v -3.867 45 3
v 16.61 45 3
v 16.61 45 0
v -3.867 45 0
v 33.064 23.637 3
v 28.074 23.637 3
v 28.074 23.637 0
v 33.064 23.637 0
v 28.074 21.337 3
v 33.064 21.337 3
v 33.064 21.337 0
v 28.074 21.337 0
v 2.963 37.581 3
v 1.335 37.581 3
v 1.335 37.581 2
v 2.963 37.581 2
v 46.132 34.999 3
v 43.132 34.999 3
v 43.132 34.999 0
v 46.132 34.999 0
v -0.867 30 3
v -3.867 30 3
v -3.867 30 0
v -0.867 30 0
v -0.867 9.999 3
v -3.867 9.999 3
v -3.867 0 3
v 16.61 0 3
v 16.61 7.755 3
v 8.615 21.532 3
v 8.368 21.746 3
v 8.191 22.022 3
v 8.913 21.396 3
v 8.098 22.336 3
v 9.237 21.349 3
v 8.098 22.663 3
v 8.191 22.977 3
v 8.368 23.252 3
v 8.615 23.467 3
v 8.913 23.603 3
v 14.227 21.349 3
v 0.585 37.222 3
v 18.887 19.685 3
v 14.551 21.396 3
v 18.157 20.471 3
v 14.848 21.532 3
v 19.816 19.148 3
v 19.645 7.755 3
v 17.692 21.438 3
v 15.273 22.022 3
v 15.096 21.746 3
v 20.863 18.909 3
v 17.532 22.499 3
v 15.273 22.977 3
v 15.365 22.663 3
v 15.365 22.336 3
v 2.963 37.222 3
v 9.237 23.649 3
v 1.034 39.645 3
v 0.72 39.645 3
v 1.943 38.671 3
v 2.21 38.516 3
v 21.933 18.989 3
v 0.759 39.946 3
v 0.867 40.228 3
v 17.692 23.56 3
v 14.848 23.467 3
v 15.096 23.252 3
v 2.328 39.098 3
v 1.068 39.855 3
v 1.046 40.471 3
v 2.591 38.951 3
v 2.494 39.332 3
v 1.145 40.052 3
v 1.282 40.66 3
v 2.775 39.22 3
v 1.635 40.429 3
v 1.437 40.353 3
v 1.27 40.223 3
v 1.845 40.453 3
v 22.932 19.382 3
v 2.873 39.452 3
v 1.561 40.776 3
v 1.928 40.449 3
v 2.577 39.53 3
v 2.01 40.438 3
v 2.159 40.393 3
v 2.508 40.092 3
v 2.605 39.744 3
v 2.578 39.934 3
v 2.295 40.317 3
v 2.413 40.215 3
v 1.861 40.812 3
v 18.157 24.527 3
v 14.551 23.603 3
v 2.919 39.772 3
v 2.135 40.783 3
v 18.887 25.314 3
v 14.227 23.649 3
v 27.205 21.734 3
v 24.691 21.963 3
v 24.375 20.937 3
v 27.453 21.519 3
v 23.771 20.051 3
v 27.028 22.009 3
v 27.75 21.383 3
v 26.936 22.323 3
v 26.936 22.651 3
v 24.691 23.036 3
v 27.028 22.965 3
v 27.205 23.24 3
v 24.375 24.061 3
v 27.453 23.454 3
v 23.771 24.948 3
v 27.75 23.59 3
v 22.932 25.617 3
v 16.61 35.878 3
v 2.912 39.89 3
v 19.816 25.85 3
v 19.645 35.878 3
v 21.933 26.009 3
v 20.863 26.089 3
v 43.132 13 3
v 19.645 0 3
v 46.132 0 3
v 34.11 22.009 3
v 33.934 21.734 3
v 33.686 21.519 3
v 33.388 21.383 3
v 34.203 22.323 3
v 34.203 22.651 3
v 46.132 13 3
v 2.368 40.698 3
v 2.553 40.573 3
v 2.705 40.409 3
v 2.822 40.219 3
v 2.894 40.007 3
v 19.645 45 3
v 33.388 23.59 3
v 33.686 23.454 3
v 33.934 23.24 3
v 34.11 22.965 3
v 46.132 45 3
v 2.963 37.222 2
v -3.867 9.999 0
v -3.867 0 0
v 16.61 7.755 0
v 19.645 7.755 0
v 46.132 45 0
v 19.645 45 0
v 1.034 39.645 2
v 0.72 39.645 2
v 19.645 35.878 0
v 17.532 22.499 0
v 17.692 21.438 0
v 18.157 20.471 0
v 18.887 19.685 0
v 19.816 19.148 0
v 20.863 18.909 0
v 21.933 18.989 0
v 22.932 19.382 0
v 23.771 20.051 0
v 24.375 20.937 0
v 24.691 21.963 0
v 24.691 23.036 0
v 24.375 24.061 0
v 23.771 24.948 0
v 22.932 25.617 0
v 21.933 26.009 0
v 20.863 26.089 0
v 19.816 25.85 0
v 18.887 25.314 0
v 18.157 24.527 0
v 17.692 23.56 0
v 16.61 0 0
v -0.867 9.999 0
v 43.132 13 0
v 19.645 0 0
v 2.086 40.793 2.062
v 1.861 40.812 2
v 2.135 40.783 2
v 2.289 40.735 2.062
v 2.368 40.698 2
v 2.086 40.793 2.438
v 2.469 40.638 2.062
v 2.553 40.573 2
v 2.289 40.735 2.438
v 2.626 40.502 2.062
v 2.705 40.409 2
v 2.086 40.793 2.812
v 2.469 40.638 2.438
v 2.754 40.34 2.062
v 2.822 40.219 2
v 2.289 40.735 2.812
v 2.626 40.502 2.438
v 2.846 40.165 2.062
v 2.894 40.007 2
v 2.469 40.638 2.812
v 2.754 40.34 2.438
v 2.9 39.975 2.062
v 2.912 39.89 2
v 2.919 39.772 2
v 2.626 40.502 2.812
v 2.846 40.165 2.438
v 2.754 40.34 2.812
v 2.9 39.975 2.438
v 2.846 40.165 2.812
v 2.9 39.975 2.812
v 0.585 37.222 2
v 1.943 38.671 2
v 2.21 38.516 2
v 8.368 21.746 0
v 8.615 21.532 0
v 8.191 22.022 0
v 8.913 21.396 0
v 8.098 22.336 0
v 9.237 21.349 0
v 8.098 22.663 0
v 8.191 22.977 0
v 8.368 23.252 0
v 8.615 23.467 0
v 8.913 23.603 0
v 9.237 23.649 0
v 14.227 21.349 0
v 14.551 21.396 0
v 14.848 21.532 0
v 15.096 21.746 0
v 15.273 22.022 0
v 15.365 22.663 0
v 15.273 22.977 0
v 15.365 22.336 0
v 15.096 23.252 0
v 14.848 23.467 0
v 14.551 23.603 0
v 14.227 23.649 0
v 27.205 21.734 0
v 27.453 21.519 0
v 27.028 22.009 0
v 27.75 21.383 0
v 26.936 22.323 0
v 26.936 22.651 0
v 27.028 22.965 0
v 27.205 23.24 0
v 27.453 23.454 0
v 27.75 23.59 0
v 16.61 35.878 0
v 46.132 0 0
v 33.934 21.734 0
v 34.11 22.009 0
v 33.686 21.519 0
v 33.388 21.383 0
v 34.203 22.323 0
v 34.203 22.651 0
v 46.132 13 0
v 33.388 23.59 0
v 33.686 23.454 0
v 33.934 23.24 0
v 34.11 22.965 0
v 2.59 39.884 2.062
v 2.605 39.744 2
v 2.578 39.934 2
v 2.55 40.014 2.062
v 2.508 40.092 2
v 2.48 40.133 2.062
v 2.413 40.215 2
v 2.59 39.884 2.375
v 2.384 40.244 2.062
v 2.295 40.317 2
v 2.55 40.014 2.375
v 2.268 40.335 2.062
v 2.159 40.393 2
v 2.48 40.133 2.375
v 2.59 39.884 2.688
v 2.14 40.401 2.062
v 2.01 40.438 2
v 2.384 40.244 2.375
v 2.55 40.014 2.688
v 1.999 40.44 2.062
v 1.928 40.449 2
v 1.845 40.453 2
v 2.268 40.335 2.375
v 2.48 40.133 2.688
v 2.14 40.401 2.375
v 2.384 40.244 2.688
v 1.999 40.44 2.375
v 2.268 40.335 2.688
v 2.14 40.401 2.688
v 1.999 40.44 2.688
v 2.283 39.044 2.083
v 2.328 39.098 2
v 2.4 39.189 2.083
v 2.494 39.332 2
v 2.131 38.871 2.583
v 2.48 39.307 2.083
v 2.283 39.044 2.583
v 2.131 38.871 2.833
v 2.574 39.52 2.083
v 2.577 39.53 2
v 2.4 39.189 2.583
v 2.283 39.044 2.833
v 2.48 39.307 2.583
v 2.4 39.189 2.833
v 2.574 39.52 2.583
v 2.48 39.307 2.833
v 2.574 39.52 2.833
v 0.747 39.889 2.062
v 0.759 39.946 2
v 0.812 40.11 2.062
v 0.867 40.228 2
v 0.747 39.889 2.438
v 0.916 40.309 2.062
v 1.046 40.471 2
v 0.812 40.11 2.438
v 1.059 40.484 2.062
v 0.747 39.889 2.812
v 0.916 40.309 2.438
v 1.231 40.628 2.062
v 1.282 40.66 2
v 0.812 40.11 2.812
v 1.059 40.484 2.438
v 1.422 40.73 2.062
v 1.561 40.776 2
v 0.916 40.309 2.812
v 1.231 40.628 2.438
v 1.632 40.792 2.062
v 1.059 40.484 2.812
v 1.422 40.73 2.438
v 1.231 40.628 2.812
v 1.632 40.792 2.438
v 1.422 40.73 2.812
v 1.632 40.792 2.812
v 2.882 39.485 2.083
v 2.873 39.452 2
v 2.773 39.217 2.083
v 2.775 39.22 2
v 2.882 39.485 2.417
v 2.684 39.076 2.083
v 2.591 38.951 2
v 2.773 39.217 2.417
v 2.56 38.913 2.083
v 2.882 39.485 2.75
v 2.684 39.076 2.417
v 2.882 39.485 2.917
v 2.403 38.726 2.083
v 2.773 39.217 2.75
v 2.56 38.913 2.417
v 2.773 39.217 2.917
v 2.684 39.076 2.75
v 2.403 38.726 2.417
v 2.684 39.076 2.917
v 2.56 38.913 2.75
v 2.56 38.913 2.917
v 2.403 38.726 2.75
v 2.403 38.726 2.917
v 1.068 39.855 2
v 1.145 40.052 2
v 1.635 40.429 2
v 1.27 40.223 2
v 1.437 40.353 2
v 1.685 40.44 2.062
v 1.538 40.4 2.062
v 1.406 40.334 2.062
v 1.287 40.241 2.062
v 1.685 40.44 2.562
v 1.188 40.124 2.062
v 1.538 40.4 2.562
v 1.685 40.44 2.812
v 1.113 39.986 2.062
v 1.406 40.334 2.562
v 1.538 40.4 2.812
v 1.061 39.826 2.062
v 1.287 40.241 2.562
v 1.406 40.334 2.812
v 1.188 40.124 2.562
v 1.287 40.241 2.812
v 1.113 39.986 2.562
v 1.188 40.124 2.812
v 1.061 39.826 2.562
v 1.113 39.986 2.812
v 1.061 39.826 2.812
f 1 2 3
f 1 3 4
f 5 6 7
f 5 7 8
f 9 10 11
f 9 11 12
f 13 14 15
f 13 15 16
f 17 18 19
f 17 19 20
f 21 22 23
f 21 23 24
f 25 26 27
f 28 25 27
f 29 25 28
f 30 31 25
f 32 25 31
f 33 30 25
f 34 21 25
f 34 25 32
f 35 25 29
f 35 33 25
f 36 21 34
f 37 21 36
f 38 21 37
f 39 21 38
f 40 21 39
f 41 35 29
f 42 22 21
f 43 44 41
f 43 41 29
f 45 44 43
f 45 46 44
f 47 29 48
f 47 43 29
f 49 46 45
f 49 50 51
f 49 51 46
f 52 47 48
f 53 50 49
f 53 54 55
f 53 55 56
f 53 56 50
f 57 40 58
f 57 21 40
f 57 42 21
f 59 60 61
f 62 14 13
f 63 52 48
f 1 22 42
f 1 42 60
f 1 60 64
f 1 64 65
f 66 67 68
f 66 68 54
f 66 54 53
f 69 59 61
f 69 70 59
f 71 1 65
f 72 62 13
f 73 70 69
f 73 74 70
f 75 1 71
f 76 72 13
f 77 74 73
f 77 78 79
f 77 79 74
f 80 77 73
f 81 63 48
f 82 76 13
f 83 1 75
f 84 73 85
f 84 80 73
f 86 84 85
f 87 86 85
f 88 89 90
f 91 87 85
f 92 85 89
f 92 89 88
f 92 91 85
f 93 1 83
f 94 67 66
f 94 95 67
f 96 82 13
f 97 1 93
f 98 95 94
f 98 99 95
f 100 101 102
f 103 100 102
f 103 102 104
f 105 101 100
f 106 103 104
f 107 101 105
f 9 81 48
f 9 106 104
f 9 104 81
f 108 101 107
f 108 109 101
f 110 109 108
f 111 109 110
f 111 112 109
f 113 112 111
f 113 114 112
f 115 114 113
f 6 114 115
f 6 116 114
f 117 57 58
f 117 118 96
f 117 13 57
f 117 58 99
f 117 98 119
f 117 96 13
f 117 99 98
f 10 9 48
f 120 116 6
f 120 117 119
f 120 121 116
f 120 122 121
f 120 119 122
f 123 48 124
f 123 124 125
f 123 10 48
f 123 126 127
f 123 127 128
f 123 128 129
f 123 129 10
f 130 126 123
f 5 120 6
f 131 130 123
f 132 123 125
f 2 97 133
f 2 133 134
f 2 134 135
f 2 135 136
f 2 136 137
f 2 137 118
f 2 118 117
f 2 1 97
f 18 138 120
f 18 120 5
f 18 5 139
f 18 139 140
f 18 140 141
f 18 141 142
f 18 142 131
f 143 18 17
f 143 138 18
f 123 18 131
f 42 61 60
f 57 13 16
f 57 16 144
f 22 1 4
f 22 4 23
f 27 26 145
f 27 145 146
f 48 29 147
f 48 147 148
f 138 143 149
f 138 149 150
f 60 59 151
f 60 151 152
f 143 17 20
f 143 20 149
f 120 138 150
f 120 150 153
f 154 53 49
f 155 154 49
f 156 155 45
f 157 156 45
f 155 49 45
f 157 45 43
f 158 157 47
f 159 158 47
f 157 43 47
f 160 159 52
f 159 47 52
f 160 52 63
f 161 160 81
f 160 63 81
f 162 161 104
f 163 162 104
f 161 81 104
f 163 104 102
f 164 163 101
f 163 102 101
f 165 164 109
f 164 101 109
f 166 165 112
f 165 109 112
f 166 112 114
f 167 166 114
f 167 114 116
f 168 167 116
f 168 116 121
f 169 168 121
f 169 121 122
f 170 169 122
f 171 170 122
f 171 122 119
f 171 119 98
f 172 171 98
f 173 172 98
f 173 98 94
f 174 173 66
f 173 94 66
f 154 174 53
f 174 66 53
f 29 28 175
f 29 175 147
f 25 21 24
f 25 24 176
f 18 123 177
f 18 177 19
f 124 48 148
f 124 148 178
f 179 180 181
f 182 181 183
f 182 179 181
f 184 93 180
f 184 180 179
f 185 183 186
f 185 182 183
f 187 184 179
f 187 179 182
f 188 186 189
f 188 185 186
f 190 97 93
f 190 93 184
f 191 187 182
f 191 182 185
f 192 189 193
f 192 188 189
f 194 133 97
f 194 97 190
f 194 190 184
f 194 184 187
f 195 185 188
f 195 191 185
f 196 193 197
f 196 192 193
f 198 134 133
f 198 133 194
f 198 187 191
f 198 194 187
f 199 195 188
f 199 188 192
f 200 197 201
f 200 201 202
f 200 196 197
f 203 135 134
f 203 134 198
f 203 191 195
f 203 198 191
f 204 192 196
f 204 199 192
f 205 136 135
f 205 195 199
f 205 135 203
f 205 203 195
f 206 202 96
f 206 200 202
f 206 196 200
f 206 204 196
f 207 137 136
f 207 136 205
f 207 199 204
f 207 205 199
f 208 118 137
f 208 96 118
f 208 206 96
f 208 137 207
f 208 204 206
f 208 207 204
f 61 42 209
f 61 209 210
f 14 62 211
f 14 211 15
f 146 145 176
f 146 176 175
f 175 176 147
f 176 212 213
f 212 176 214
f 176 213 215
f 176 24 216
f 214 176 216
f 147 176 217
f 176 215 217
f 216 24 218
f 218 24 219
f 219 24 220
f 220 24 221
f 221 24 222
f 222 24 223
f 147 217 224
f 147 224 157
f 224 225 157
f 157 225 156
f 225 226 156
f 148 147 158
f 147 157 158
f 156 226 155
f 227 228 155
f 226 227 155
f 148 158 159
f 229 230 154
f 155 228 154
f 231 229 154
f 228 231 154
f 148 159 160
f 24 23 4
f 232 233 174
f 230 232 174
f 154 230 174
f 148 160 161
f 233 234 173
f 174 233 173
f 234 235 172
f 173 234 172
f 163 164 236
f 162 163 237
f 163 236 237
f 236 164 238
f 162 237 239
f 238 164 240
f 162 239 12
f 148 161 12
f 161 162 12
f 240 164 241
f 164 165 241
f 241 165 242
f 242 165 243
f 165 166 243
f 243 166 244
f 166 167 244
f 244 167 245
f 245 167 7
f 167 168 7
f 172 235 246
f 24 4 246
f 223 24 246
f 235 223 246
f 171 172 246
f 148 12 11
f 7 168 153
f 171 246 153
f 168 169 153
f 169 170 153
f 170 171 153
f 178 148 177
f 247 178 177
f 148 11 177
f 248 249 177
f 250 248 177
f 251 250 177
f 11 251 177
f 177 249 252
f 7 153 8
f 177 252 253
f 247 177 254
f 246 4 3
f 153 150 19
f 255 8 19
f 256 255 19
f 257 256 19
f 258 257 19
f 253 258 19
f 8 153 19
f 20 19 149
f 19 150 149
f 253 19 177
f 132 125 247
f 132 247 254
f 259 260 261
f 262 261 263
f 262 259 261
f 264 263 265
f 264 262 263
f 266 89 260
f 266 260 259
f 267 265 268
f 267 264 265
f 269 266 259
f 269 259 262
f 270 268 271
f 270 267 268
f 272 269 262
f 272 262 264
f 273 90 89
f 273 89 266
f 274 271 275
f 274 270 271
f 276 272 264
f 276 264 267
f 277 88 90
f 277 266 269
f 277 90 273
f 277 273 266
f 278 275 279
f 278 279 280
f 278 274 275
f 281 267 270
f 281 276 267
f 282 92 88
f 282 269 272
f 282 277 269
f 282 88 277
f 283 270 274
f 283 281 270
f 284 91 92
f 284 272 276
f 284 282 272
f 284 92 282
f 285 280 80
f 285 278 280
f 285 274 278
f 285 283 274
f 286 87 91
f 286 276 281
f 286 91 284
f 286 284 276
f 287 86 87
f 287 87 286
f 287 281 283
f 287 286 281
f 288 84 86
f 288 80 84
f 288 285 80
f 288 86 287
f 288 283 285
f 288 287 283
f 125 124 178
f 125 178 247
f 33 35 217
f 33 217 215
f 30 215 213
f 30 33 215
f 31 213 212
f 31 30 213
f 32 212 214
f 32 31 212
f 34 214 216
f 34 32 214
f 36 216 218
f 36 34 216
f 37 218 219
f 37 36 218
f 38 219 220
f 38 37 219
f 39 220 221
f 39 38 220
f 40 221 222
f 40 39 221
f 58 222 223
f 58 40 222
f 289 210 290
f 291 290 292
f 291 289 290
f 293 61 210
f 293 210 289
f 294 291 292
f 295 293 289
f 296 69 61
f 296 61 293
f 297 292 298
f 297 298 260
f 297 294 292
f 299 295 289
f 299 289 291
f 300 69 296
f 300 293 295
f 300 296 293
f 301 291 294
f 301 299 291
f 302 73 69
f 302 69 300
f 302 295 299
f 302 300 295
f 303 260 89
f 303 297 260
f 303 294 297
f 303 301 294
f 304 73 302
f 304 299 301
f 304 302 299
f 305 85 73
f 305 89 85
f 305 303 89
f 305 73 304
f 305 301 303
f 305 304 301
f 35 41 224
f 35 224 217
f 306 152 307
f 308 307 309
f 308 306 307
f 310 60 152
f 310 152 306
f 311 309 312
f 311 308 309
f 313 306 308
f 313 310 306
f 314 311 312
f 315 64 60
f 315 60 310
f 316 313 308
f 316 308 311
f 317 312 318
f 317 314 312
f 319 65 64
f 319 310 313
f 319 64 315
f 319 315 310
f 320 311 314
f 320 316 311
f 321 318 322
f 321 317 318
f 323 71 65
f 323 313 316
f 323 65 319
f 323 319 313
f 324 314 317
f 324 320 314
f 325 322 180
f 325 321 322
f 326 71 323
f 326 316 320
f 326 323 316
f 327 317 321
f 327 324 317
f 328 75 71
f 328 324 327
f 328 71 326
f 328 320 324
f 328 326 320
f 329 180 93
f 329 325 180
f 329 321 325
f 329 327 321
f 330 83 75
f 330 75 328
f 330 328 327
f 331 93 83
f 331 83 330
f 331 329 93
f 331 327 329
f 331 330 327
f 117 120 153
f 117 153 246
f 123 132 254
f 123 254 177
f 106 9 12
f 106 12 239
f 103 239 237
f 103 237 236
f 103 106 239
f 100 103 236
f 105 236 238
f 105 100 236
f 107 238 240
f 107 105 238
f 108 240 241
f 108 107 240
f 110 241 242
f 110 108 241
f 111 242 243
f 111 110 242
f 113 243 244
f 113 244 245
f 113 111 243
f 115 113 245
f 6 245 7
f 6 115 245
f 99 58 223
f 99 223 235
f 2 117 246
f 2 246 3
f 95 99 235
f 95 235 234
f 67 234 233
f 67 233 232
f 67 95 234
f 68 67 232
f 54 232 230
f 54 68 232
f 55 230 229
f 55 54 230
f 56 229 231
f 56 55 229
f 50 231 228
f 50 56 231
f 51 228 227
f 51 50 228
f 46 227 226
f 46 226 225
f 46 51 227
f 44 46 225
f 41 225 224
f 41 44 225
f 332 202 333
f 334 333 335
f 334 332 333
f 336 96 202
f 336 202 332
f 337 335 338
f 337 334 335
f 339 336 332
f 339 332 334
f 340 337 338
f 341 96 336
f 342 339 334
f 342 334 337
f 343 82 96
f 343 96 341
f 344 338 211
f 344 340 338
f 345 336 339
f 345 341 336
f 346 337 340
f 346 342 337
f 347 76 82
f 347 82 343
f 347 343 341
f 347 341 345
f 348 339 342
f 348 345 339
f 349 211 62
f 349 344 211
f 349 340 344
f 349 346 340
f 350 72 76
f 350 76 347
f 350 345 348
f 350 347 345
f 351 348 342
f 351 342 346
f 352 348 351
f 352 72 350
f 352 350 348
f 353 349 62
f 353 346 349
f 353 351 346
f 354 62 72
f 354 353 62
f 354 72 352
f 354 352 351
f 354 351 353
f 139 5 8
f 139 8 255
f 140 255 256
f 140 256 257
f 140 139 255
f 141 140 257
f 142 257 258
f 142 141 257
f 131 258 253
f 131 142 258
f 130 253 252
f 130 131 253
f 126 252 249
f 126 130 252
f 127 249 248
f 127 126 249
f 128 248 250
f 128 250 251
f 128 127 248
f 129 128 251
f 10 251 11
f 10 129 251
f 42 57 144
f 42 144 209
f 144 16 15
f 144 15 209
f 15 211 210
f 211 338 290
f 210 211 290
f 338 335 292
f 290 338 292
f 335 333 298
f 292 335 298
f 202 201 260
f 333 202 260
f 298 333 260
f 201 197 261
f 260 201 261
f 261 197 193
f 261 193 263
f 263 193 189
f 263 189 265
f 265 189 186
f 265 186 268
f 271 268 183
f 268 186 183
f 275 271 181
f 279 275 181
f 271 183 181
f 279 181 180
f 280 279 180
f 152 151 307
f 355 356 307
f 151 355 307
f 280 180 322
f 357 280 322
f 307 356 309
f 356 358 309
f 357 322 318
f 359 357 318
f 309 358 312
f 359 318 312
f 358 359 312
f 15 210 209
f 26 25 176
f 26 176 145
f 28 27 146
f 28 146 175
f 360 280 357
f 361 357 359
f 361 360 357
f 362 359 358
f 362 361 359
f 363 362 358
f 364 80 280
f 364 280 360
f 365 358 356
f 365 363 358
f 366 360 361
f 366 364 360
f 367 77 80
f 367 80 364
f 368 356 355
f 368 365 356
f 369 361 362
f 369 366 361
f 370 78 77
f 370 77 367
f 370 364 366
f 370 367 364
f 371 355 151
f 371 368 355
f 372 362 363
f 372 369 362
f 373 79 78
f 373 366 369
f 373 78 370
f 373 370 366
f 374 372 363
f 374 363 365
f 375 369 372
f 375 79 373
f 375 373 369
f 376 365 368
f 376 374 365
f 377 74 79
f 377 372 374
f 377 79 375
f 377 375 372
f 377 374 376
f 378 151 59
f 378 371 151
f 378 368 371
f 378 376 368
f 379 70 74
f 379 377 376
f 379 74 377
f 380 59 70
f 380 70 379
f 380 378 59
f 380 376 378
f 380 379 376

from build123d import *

# Parameters (mm, degrees)
SKETCH_1_R          = 3.6
EXTRUDE_1_DEPTH     = 3
CUT_EXTRUDE_2_DEPTH = 1


with BuildPart() as part:
    # 草图1 → 凸台-拉伸1 (new body)
    with BuildSketch(Plane.XY.offset(3)):
        Polygon((46.131858504, 44.9999), (19.645182907, 44.9999), (19.645182907, 35.877980345), (16.61, 35.877980345), (16.61, 44.9999), (-3.867371496, 44.9999), (-3.867371496, 29.9998), (-0.867341496, 29.9998), (-0.867341496, 9.9991), (-3.867371496, 9.9991), (-3.867371496, 0), (16.61, 0), (16.61, 7.754820329), (19.645182907, 7.754820329), (19.645182907, 0), (46.131858504, 0), (46.131858504, 13.0005), (43.131858504, 13.0005), (43.131858504, 34.9994), (46.131858504, 34.9994), align=None)
        with Locations(Location((21.131658504, 22.4992, 0), (0, 0, 180))):
            Circle(SKETCH_1_R, mode=Mode.SUBTRACT)
        with BuildLine():
            Line((9.236684618, 23.64925), (14.226589495, 23.64925))
            ThreePointArc((14.226589495, 23.64925), (15.376589495, 22.49925), (14.226589495, 21.34925))
            Line((14.226589495, 21.34925), (9.236684618, 21.34925))
            ThreePointArc((9.236684618, 21.34925), (8.086684618, 22.49925), (9.236684618, 23.64925))
        make_face(mode=Mode.SUBTRACT)
        with BuildLine():
            Line((33.064389495, 21.33685), (28.074484618, 21.33685))
            ThreePointArc((28.074484618, 21.33685), (26.924484618, 22.48685), (28.074484618, 23.63685))
            Line((28.074484618, 23.63685), (33.064389495, 23.63685))
            ThreePointArc((33.064389495, 23.63685), (34.214389495, 22.48685), (33.064389495, 21.33685))
        make_face(mode=Mode.SUBTRACT)
    extrude(amount=-EXTRUDE_1_DEPTH)

    # 草图3 → 切除-拉伸2 (cut)
    with BuildSketch(Plane.XY.offset(3)):
        with BuildLine():
            Line((1.034005341, 39.645473757), (0.719902777, 39.645473757))
            add(Edge.make_bspline(
                [(0.719902777, 39.645473757), (0.72194993, 39.687144645), (0.725970484, 39.768985159), (0.744798774, 39.888309066), (0.771739651, 40.002363865), (0.809831105, 40.110233779), (0.857137383, 40.212872586), (0.91386741, 40.309872601), (0.98106126, 40.40086379), (1.057267995, 40.485002633), (1.140036634, 40.562190204), (1.229342573, 40.628845447), (1.3231876, 40.685163118), (1.421286999, 40.73224436), (1.524747563, 40.767584206), (1.632630421, 40.793805846), (1.745409557, 40.809582191), (1.822249579, 40.811277977), (1.861329059, 40.812140424)],
                knots=[0, 0, 0, 0, 1.10065271, 2.161652631, 3.183658789, 4.190468796, 5.17591951, 6.163126047, 7.15150782, 8.156236427, 9.156009102, 10.134482811, 11.092018607, 12.041330605, 13.001268258, 13.972401359, 14.968799086, 16, 16, 16, 16], degree=3))
            add(Edge.make_bspline(
                [(1.861329059, 40.812140424), (1.899707133, 40.811241967), (1.975118678, 40.809476532), (2.085180693, 40.794315503), (2.189957987, 40.770569912), (2.289245754, 40.737254495), (2.382251818, 40.692470068), (2.469674863, 40.638672529), (2.552555673, 40.576452698), (2.627162457, 40.503198884), (2.695670536, 40.4249965), (2.754772791, 40.341508596), (2.805385955, 40.255279311), (2.847573635, 40.165651109), (2.878629774, 40.071780081), (2.902207982, 39.975032878), (2.915535395, 39.874408067), (2.917580819, 39.806301511), (2.918620726, 39.77167568)],
                knots=[0, 0, 0, 0, 1.111607364, 2.184268762, 3.212621178, 4.221274766, 5.211760367, 6.196651075, 7.1921475, 8.207485113, 9.220403448, 10.201281604, 11.166441695, 12.114753415, 13.065576456, 14.026450734, 14.996634279, 16, 16, 16, 16], degree=3))
            add(Edge.make_bspline(
                [(2.918620726, 39.77167568), (2.916927463, 39.722927846), (2.913570652, 39.626287632), (2.884856275, 39.484272769), (2.840009764, 39.34667935), (2.786012407, 39.235942048), (2.731539963, 39.146708554), (2.682452456, 39.073239849), (2.624987645, 38.994134381), (2.558309147, 38.909657044), (2.483796274, 38.819146138), (2.400774111, 38.722656343), (2.308650629, 38.621184573), (2.243992128, 38.551878972), (2.210487713, 38.515966546)],
                knots=[0, 0, 0, 0, 1.184426356, 2.348067706, 3.509069118, 4.696110526, 5.333549288, 6.050745305, 6.844228056, 7.710549037, 8.667450064, 9.695053472, 10.805634456, 12, 12, 12, 12], degree=3))
            Line((2.210487713, 38.515966546), (1.334786591, 37.581371193))
            Line((1.334786591, 37.581371193), (2.963492521, 37.581371193))
            Line((2.963492521, 37.581371193), (2.963492521, 37.222396834))
            Line((2.963492521, 37.222396834), (0.585287393, 37.222396834))
            Line((0.585287393, 37.222396834), (1.942659188, 38.670914462))
            add(Edge.make_bspline(
                [(1.942659188, 38.670914462), (1.975707074, 38.705412769), (2.039185301, 38.771676955), (2.128967878, 38.868419915), (2.209606867, 38.958169456), (2.281624259, 39.040756005), (2.343457765, 39.117387572), (2.398329997, 39.185582276), (2.442295588, 39.248336726), (2.490010983, 39.32107734), (2.536224965, 39.409889657), (2.575937321, 39.518423347), (2.600152169, 39.630150599), (2.603057005, 39.705652636), (2.604518162, 39.743630808)],
                knots=[0, 0, 0, 0, 1.329631726, 2.553950428, 3.673215718, 4.687767853, 5.603093632, 6.413772471, 7.123043292, 7.734684054, 8.834405432, 9.900288307, 10.943827018, 12, 12, 12, 12], degree=3))
            add(Edge.make_bspline(
                [(2.604518162, 39.743630808), (2.60388242, 39.767512207), (2.602629494, 39.814577857), (2.591571796, 39.883583616), (2.57486129, 39.95014843), (2.550916032, 40.014477049), (2.519309292, 40.075922701), (2.480835912, 40.134560181), (2.436445849, 40.191249147), (2.385094579, 40.244402445), (2.328683059, 40.29308365), (2.26908881, 40.336207736), (2.206038706, 40.372246846), (2.139798583, 40.401790343), (2.070553114, 40.424965725), (1.998168369, 40.441024304), (1.922844353, 40.451106788), (1.871410857, 40.45247096), (1.845203258, 40.453166065)],
                knots=[0, 0, 0, 0, 0.991446411, 1.95395049, 2.89581595, 3.838931463, 4.798493298, 5.75982156, 6.748411868, 7.785213223, 8.824556874, 9.840280684, 10.836137867, 11.835679398, 12.848801643, 13.863922112, 14.911575587, 16, 16, 16, 16], degree=3))
            add(Edge.make_bspline(
                [(1.845203258, 40.453166065), (1.817832425, 40.452451033), (1.764080629, 40.451046827), (1.685161596, 40.441224163), (1.609875819, 40.424278323), (1.538033916, 40.401101648), (1.46951433, 40.3716431), (1.404650286, 40.334951355), (1.343587397, 40.291167862), (1.286210873, 40.241527305), (1.233346894, 40.186259704), (1.186900018, 40.124649741), (1.146316004, 40.057822326), (1.110906771, 39.985957775), (1.082151081, 39.908403995), (1.06017793, 39.82543629), (1.042791083, 39.737414909), (1.036982563, 39.676629824), (1.034005341, 39.645473757)],
                knots=[0, 0, 0, 0, 1.031018746, 2.02475058, 2.990194455, 3.934040569, 4.864654155, 5.795059489, 6.735614925, 7.690564532, 8.649604399, 9.611025574, 10.590972636, 11.591080095, 12.624614302, 13.701020113, 14.821632451, 16, 16, 16, 16], degree=3))
        make_face()
    extrude(amount=-CUT_EXTRUDE_2_DEPTH, mode=Mode.SUBTRACT)


solid = part.part
